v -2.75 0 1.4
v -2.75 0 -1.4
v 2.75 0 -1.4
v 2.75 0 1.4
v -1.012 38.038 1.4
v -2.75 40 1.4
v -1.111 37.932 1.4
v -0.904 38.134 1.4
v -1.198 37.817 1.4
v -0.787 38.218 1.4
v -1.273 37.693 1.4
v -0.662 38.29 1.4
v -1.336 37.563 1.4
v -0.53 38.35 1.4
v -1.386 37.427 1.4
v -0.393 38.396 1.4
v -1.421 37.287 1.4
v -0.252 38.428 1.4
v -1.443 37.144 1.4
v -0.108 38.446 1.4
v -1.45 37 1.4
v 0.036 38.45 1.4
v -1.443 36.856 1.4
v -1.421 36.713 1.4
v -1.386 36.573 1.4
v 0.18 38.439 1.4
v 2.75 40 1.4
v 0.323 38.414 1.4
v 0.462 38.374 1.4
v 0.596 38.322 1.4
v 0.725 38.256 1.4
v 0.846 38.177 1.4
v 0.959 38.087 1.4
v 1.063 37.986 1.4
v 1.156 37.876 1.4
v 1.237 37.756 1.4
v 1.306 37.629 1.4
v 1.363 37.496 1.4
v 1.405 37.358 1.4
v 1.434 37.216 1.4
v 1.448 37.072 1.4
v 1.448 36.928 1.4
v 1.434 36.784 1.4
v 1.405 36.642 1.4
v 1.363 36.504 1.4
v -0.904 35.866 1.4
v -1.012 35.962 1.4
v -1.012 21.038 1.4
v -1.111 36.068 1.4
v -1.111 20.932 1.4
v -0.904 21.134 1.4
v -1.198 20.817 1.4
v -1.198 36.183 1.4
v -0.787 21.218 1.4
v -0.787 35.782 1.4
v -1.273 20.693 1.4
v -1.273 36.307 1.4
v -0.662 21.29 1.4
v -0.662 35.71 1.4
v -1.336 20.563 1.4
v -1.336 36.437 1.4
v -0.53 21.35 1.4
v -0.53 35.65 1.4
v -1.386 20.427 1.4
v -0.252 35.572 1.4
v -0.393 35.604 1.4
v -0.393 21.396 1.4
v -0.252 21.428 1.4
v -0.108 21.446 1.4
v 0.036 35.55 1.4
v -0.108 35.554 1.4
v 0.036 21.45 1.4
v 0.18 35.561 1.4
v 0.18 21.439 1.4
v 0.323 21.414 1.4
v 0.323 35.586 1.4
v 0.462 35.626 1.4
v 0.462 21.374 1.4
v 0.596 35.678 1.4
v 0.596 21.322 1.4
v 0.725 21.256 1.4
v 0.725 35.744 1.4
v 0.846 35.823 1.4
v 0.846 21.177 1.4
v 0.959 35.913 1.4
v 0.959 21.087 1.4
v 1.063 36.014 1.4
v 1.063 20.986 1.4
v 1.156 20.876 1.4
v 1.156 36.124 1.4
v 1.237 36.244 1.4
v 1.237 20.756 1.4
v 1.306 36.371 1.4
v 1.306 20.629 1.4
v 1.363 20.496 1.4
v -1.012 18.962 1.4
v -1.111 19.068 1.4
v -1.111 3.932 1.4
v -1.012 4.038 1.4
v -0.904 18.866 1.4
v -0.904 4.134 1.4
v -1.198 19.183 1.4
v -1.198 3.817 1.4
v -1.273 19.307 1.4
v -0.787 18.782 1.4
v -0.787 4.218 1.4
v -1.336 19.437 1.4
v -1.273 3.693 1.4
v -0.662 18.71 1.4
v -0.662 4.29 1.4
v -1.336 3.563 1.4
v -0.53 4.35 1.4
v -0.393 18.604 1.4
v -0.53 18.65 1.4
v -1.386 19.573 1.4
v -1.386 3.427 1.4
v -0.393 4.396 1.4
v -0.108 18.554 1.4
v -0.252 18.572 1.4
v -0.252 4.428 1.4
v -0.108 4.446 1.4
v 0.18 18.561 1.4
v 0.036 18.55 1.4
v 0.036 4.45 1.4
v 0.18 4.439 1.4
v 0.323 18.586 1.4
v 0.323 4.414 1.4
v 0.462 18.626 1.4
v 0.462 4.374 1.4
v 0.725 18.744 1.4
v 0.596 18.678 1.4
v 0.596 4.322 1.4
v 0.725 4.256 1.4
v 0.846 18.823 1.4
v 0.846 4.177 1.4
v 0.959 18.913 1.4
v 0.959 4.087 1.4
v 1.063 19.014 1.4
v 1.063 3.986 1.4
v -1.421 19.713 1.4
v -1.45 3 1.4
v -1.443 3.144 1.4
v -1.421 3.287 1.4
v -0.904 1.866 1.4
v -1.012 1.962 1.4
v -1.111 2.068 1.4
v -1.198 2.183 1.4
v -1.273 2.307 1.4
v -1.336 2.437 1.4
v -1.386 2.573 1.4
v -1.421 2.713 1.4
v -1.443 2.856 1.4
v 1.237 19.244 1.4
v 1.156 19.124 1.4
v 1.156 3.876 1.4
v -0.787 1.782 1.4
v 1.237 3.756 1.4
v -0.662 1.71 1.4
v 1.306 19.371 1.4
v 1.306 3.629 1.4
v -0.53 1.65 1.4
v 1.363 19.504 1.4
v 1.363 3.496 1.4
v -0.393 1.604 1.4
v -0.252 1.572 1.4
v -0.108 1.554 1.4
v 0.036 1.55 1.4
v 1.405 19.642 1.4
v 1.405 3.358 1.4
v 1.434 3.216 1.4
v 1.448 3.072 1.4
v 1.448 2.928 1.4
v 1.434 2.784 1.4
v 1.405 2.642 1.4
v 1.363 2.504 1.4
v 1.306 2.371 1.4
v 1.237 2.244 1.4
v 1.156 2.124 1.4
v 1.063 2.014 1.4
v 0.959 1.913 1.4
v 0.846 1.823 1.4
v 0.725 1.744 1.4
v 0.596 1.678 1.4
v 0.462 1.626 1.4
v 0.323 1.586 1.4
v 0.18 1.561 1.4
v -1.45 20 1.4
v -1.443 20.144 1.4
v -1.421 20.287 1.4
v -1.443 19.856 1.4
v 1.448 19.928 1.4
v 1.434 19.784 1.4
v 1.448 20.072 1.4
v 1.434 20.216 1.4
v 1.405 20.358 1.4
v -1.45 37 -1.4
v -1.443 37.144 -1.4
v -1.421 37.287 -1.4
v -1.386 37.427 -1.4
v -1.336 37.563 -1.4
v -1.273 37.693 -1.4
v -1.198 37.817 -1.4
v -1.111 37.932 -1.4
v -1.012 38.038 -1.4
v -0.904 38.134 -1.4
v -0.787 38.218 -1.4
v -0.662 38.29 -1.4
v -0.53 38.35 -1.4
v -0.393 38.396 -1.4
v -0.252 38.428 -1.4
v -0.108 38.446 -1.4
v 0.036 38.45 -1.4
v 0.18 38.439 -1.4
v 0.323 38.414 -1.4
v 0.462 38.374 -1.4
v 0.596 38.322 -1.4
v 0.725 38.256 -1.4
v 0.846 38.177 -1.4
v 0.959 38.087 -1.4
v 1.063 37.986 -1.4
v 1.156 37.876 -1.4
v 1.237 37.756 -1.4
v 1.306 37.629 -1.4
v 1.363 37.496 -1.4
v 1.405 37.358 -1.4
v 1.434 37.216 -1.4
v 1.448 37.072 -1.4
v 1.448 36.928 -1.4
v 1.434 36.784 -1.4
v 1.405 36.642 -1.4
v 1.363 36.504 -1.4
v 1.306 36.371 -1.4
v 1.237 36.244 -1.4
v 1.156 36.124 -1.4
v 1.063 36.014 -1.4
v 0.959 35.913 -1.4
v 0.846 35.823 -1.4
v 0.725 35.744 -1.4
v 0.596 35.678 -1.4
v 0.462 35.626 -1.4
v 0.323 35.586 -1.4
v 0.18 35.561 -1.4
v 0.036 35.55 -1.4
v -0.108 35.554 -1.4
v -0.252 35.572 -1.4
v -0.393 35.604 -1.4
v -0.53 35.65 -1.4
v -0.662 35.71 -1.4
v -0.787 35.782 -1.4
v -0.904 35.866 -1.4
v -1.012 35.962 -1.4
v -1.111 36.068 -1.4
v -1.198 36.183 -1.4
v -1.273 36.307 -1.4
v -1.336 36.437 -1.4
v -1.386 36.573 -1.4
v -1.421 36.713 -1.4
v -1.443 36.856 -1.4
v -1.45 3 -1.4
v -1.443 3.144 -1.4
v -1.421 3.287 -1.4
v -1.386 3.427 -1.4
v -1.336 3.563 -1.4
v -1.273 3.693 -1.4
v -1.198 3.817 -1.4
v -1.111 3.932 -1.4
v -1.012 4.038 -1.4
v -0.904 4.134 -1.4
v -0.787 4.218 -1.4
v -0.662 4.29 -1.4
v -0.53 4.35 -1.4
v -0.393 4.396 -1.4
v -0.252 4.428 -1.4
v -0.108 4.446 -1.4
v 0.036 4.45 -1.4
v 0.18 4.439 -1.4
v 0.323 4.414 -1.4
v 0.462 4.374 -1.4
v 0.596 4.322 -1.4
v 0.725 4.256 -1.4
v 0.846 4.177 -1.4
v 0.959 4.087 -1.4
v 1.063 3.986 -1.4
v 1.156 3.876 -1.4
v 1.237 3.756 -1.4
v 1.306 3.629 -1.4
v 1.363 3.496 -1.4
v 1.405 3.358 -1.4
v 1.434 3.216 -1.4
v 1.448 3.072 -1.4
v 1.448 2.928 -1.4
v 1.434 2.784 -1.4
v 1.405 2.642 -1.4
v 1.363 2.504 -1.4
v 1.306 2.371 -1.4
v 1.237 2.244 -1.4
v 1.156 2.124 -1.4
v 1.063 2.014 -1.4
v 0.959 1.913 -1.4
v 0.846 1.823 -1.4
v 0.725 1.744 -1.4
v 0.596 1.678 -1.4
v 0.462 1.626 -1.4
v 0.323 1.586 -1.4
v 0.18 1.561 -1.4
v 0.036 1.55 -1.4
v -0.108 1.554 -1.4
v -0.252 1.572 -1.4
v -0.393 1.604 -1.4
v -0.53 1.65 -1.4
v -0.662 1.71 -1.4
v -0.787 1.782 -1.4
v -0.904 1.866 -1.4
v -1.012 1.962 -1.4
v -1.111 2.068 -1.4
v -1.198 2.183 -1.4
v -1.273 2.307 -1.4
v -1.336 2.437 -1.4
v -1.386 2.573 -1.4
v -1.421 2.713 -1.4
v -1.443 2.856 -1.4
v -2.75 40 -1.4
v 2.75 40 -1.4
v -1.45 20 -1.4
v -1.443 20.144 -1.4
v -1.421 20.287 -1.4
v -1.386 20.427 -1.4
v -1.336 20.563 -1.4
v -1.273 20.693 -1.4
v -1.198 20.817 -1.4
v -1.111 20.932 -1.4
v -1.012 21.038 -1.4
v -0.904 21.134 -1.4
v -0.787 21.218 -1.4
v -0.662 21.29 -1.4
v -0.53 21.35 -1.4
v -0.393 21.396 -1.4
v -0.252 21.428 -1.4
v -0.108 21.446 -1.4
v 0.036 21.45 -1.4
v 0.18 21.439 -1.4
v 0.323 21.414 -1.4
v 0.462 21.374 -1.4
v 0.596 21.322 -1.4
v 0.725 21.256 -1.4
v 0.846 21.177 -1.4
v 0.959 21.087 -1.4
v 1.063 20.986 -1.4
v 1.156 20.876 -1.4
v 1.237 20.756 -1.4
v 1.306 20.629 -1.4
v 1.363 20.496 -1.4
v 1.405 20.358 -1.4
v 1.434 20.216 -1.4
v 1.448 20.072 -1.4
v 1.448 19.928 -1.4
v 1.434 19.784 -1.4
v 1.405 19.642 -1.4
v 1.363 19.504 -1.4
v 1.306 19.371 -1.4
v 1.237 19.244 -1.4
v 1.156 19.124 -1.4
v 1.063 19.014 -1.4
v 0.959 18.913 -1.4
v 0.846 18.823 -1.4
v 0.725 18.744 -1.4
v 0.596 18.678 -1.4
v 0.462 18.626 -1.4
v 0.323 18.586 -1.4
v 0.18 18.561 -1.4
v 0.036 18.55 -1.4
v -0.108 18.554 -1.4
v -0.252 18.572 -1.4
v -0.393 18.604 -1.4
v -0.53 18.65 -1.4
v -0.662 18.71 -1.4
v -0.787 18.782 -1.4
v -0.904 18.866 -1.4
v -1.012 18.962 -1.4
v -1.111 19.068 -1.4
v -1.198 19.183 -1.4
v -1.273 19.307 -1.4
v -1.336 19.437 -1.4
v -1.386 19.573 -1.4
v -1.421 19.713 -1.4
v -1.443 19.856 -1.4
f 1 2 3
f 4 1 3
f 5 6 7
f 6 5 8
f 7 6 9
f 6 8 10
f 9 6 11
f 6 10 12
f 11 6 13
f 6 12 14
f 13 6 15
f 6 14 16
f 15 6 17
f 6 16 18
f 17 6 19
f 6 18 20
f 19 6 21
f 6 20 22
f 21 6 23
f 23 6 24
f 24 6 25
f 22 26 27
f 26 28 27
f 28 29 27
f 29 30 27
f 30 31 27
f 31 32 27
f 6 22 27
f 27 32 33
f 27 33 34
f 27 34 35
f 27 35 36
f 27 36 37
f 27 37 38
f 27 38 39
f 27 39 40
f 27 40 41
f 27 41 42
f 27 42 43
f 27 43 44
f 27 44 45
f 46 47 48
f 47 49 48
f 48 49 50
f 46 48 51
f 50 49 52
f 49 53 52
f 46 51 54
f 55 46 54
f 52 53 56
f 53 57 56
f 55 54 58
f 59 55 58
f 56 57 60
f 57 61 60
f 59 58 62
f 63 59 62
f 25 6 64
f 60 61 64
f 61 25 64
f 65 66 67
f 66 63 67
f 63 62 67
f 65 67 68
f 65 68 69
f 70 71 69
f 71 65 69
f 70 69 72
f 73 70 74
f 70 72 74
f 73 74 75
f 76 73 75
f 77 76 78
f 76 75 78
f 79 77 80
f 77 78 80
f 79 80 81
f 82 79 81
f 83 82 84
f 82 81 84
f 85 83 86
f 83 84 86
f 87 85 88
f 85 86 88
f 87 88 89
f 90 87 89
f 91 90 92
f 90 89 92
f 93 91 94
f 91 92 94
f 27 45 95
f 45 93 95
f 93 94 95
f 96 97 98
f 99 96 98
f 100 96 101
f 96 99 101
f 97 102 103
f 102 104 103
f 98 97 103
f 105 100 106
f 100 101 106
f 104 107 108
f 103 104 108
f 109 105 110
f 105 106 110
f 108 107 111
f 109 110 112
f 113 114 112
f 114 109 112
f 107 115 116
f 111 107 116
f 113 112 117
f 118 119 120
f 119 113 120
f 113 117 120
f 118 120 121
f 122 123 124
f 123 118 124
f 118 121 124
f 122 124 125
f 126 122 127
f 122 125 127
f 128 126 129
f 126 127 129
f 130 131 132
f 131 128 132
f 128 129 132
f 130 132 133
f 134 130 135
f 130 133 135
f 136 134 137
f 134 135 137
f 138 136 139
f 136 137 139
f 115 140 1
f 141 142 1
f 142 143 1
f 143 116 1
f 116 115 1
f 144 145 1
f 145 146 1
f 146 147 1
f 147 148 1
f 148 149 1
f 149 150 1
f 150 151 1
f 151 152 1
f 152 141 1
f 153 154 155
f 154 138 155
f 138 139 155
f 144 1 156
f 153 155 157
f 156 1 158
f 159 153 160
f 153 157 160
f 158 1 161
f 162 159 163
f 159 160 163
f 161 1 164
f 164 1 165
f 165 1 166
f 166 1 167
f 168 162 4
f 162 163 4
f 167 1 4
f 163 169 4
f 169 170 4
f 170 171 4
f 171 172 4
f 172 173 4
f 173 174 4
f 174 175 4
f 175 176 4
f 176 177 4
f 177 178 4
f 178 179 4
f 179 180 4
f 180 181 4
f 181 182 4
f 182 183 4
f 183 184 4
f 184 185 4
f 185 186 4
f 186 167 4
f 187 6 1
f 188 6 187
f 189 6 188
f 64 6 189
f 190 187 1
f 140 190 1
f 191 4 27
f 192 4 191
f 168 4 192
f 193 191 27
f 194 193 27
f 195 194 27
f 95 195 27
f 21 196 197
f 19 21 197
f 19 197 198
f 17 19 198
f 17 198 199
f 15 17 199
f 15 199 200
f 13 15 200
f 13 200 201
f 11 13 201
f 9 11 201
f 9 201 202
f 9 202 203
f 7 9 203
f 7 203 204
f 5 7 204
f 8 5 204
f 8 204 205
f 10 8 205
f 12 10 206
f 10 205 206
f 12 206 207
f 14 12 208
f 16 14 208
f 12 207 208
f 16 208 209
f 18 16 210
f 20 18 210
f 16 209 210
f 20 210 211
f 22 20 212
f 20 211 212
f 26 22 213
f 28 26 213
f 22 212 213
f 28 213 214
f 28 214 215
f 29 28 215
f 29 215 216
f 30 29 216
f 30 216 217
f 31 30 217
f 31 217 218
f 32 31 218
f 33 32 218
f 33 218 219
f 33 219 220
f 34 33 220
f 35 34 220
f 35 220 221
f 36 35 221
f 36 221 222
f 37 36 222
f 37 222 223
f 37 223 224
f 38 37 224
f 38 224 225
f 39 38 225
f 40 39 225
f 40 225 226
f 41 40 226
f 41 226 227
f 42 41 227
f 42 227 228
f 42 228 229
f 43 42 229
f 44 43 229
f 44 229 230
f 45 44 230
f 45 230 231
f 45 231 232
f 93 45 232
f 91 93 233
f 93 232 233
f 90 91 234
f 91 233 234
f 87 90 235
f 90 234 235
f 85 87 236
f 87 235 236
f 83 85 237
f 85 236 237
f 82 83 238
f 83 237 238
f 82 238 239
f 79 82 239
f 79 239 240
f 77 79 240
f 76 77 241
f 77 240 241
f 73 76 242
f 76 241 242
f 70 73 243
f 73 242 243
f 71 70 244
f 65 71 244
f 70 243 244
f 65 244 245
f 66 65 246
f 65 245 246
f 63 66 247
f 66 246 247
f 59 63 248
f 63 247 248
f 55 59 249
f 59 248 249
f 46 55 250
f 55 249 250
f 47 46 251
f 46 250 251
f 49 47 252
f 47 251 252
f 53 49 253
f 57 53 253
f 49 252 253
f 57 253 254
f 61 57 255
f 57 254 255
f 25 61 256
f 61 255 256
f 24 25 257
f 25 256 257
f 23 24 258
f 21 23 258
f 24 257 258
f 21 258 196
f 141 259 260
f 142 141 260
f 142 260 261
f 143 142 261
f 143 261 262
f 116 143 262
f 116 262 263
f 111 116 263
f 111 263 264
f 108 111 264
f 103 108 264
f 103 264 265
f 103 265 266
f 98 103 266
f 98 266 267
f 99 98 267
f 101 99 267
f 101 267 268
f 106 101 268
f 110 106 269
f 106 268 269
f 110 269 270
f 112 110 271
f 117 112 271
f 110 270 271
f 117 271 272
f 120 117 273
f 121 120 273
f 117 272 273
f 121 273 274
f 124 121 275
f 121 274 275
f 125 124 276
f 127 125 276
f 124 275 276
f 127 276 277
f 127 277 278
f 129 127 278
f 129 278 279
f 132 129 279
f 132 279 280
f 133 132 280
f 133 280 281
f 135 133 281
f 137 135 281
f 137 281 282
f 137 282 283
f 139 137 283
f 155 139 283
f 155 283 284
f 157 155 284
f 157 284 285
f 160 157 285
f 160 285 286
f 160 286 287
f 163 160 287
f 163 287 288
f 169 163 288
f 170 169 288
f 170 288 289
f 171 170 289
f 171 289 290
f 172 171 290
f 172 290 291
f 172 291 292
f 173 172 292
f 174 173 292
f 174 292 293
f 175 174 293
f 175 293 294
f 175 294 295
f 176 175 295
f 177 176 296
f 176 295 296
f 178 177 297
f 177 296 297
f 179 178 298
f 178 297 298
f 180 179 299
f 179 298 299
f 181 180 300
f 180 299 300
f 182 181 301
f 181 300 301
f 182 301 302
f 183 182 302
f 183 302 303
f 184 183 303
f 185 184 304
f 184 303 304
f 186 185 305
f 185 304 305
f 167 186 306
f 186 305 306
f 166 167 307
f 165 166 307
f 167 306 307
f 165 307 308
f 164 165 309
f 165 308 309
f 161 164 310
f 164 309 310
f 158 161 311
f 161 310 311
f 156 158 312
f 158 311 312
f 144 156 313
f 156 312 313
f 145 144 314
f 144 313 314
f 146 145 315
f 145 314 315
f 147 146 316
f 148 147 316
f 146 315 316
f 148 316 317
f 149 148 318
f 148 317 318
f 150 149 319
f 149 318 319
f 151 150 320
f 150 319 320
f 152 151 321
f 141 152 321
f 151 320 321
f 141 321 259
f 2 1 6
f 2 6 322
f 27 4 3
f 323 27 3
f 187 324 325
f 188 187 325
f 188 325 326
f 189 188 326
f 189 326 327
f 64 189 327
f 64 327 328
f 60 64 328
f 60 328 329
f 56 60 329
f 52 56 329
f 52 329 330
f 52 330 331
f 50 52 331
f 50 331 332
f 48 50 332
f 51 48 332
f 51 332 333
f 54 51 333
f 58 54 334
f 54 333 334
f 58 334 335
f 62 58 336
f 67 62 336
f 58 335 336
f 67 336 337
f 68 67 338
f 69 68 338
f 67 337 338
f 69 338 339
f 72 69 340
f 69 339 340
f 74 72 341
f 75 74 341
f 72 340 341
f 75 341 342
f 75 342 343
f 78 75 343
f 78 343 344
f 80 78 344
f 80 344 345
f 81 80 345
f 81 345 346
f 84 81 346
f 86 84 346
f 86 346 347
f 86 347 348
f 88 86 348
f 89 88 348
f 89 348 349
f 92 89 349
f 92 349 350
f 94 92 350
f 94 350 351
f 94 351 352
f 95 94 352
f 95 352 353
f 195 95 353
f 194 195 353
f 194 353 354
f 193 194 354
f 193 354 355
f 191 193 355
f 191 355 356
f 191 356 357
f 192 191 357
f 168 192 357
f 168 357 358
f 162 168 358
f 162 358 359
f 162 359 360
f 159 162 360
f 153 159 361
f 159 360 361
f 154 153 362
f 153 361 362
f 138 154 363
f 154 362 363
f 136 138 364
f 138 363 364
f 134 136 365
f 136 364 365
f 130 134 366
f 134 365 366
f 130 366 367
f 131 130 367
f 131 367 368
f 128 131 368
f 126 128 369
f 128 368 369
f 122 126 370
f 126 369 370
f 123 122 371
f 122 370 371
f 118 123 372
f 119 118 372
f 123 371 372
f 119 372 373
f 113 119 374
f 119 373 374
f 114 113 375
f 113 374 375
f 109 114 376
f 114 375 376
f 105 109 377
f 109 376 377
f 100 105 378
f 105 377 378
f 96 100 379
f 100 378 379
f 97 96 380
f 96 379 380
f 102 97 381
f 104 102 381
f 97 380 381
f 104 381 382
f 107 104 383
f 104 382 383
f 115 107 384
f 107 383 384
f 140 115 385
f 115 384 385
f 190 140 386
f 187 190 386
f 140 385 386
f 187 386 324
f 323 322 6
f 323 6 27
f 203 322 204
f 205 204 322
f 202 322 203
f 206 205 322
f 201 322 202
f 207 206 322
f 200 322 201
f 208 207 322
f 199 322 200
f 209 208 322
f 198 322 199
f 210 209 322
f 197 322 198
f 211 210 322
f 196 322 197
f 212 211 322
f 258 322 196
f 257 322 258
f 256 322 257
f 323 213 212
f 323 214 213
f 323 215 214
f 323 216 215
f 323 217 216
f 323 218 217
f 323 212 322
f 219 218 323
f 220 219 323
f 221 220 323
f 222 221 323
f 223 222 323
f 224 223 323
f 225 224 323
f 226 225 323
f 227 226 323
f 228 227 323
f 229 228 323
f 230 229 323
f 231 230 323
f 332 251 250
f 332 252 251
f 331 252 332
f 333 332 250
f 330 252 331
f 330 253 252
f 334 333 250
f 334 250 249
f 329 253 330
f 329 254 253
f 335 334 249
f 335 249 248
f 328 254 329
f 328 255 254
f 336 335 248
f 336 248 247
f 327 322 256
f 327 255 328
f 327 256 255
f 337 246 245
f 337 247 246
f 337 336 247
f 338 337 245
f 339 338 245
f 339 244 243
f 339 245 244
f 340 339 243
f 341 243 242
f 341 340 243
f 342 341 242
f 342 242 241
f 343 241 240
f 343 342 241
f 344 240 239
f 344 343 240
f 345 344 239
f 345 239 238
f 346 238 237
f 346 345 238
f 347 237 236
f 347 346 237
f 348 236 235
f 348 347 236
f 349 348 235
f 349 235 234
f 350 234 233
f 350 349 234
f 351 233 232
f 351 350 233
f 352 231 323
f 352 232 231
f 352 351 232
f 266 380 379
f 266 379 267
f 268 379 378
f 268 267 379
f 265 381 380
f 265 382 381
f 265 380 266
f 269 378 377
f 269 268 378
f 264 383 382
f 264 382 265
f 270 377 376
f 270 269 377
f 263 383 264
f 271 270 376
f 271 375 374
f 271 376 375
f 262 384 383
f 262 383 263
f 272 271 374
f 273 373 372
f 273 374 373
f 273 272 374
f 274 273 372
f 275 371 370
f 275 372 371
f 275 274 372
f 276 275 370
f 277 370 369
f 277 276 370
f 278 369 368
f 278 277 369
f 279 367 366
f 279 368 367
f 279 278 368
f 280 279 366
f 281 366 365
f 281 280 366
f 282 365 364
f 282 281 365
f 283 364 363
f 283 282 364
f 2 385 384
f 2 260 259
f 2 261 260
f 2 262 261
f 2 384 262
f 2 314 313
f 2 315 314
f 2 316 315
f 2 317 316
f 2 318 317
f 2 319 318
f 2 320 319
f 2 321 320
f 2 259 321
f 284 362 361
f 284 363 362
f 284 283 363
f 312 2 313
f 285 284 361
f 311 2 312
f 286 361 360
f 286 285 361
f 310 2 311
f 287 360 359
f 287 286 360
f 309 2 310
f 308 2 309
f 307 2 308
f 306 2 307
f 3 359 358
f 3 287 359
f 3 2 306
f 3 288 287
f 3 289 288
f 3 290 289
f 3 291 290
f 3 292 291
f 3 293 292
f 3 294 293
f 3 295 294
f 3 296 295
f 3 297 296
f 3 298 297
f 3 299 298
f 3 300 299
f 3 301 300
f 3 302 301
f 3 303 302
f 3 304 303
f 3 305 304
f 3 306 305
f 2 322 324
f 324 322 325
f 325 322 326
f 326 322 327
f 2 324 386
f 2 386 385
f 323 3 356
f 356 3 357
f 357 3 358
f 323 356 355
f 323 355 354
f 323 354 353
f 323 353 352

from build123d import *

# Parameters (mm, degrees)
SKETCH1_W              = 5.5
SKETCH1_H              = 2.8
BOSS_EXTRUDE1_DEPTH    = 40
M2_5_CLEARANCE_HOLE1_D = 2.9


with BuildPart() as part:
    # Sketch1 → Boss-Extrude1 (new body)
    with BuildSketch(Plane(origin=(0, 0, 0), x_dir=(1, 0, 0), z_dir=(0, 1, 0))):
        Rectangle(SKETCH1_W, SKETCH1_H)
    extrude(amount=BOSS_EXTRUDE1_DEPTH)

    # M2.5 Clearance Hole1 (through all)
    with Locations(Plane.XY.offset(1.4)):
        with Locations((0, 20), (0, 37), (0, 3)):
            Hole(M2_5_CLEARANCE_HOLE1_D / 2)


solid = part.part
